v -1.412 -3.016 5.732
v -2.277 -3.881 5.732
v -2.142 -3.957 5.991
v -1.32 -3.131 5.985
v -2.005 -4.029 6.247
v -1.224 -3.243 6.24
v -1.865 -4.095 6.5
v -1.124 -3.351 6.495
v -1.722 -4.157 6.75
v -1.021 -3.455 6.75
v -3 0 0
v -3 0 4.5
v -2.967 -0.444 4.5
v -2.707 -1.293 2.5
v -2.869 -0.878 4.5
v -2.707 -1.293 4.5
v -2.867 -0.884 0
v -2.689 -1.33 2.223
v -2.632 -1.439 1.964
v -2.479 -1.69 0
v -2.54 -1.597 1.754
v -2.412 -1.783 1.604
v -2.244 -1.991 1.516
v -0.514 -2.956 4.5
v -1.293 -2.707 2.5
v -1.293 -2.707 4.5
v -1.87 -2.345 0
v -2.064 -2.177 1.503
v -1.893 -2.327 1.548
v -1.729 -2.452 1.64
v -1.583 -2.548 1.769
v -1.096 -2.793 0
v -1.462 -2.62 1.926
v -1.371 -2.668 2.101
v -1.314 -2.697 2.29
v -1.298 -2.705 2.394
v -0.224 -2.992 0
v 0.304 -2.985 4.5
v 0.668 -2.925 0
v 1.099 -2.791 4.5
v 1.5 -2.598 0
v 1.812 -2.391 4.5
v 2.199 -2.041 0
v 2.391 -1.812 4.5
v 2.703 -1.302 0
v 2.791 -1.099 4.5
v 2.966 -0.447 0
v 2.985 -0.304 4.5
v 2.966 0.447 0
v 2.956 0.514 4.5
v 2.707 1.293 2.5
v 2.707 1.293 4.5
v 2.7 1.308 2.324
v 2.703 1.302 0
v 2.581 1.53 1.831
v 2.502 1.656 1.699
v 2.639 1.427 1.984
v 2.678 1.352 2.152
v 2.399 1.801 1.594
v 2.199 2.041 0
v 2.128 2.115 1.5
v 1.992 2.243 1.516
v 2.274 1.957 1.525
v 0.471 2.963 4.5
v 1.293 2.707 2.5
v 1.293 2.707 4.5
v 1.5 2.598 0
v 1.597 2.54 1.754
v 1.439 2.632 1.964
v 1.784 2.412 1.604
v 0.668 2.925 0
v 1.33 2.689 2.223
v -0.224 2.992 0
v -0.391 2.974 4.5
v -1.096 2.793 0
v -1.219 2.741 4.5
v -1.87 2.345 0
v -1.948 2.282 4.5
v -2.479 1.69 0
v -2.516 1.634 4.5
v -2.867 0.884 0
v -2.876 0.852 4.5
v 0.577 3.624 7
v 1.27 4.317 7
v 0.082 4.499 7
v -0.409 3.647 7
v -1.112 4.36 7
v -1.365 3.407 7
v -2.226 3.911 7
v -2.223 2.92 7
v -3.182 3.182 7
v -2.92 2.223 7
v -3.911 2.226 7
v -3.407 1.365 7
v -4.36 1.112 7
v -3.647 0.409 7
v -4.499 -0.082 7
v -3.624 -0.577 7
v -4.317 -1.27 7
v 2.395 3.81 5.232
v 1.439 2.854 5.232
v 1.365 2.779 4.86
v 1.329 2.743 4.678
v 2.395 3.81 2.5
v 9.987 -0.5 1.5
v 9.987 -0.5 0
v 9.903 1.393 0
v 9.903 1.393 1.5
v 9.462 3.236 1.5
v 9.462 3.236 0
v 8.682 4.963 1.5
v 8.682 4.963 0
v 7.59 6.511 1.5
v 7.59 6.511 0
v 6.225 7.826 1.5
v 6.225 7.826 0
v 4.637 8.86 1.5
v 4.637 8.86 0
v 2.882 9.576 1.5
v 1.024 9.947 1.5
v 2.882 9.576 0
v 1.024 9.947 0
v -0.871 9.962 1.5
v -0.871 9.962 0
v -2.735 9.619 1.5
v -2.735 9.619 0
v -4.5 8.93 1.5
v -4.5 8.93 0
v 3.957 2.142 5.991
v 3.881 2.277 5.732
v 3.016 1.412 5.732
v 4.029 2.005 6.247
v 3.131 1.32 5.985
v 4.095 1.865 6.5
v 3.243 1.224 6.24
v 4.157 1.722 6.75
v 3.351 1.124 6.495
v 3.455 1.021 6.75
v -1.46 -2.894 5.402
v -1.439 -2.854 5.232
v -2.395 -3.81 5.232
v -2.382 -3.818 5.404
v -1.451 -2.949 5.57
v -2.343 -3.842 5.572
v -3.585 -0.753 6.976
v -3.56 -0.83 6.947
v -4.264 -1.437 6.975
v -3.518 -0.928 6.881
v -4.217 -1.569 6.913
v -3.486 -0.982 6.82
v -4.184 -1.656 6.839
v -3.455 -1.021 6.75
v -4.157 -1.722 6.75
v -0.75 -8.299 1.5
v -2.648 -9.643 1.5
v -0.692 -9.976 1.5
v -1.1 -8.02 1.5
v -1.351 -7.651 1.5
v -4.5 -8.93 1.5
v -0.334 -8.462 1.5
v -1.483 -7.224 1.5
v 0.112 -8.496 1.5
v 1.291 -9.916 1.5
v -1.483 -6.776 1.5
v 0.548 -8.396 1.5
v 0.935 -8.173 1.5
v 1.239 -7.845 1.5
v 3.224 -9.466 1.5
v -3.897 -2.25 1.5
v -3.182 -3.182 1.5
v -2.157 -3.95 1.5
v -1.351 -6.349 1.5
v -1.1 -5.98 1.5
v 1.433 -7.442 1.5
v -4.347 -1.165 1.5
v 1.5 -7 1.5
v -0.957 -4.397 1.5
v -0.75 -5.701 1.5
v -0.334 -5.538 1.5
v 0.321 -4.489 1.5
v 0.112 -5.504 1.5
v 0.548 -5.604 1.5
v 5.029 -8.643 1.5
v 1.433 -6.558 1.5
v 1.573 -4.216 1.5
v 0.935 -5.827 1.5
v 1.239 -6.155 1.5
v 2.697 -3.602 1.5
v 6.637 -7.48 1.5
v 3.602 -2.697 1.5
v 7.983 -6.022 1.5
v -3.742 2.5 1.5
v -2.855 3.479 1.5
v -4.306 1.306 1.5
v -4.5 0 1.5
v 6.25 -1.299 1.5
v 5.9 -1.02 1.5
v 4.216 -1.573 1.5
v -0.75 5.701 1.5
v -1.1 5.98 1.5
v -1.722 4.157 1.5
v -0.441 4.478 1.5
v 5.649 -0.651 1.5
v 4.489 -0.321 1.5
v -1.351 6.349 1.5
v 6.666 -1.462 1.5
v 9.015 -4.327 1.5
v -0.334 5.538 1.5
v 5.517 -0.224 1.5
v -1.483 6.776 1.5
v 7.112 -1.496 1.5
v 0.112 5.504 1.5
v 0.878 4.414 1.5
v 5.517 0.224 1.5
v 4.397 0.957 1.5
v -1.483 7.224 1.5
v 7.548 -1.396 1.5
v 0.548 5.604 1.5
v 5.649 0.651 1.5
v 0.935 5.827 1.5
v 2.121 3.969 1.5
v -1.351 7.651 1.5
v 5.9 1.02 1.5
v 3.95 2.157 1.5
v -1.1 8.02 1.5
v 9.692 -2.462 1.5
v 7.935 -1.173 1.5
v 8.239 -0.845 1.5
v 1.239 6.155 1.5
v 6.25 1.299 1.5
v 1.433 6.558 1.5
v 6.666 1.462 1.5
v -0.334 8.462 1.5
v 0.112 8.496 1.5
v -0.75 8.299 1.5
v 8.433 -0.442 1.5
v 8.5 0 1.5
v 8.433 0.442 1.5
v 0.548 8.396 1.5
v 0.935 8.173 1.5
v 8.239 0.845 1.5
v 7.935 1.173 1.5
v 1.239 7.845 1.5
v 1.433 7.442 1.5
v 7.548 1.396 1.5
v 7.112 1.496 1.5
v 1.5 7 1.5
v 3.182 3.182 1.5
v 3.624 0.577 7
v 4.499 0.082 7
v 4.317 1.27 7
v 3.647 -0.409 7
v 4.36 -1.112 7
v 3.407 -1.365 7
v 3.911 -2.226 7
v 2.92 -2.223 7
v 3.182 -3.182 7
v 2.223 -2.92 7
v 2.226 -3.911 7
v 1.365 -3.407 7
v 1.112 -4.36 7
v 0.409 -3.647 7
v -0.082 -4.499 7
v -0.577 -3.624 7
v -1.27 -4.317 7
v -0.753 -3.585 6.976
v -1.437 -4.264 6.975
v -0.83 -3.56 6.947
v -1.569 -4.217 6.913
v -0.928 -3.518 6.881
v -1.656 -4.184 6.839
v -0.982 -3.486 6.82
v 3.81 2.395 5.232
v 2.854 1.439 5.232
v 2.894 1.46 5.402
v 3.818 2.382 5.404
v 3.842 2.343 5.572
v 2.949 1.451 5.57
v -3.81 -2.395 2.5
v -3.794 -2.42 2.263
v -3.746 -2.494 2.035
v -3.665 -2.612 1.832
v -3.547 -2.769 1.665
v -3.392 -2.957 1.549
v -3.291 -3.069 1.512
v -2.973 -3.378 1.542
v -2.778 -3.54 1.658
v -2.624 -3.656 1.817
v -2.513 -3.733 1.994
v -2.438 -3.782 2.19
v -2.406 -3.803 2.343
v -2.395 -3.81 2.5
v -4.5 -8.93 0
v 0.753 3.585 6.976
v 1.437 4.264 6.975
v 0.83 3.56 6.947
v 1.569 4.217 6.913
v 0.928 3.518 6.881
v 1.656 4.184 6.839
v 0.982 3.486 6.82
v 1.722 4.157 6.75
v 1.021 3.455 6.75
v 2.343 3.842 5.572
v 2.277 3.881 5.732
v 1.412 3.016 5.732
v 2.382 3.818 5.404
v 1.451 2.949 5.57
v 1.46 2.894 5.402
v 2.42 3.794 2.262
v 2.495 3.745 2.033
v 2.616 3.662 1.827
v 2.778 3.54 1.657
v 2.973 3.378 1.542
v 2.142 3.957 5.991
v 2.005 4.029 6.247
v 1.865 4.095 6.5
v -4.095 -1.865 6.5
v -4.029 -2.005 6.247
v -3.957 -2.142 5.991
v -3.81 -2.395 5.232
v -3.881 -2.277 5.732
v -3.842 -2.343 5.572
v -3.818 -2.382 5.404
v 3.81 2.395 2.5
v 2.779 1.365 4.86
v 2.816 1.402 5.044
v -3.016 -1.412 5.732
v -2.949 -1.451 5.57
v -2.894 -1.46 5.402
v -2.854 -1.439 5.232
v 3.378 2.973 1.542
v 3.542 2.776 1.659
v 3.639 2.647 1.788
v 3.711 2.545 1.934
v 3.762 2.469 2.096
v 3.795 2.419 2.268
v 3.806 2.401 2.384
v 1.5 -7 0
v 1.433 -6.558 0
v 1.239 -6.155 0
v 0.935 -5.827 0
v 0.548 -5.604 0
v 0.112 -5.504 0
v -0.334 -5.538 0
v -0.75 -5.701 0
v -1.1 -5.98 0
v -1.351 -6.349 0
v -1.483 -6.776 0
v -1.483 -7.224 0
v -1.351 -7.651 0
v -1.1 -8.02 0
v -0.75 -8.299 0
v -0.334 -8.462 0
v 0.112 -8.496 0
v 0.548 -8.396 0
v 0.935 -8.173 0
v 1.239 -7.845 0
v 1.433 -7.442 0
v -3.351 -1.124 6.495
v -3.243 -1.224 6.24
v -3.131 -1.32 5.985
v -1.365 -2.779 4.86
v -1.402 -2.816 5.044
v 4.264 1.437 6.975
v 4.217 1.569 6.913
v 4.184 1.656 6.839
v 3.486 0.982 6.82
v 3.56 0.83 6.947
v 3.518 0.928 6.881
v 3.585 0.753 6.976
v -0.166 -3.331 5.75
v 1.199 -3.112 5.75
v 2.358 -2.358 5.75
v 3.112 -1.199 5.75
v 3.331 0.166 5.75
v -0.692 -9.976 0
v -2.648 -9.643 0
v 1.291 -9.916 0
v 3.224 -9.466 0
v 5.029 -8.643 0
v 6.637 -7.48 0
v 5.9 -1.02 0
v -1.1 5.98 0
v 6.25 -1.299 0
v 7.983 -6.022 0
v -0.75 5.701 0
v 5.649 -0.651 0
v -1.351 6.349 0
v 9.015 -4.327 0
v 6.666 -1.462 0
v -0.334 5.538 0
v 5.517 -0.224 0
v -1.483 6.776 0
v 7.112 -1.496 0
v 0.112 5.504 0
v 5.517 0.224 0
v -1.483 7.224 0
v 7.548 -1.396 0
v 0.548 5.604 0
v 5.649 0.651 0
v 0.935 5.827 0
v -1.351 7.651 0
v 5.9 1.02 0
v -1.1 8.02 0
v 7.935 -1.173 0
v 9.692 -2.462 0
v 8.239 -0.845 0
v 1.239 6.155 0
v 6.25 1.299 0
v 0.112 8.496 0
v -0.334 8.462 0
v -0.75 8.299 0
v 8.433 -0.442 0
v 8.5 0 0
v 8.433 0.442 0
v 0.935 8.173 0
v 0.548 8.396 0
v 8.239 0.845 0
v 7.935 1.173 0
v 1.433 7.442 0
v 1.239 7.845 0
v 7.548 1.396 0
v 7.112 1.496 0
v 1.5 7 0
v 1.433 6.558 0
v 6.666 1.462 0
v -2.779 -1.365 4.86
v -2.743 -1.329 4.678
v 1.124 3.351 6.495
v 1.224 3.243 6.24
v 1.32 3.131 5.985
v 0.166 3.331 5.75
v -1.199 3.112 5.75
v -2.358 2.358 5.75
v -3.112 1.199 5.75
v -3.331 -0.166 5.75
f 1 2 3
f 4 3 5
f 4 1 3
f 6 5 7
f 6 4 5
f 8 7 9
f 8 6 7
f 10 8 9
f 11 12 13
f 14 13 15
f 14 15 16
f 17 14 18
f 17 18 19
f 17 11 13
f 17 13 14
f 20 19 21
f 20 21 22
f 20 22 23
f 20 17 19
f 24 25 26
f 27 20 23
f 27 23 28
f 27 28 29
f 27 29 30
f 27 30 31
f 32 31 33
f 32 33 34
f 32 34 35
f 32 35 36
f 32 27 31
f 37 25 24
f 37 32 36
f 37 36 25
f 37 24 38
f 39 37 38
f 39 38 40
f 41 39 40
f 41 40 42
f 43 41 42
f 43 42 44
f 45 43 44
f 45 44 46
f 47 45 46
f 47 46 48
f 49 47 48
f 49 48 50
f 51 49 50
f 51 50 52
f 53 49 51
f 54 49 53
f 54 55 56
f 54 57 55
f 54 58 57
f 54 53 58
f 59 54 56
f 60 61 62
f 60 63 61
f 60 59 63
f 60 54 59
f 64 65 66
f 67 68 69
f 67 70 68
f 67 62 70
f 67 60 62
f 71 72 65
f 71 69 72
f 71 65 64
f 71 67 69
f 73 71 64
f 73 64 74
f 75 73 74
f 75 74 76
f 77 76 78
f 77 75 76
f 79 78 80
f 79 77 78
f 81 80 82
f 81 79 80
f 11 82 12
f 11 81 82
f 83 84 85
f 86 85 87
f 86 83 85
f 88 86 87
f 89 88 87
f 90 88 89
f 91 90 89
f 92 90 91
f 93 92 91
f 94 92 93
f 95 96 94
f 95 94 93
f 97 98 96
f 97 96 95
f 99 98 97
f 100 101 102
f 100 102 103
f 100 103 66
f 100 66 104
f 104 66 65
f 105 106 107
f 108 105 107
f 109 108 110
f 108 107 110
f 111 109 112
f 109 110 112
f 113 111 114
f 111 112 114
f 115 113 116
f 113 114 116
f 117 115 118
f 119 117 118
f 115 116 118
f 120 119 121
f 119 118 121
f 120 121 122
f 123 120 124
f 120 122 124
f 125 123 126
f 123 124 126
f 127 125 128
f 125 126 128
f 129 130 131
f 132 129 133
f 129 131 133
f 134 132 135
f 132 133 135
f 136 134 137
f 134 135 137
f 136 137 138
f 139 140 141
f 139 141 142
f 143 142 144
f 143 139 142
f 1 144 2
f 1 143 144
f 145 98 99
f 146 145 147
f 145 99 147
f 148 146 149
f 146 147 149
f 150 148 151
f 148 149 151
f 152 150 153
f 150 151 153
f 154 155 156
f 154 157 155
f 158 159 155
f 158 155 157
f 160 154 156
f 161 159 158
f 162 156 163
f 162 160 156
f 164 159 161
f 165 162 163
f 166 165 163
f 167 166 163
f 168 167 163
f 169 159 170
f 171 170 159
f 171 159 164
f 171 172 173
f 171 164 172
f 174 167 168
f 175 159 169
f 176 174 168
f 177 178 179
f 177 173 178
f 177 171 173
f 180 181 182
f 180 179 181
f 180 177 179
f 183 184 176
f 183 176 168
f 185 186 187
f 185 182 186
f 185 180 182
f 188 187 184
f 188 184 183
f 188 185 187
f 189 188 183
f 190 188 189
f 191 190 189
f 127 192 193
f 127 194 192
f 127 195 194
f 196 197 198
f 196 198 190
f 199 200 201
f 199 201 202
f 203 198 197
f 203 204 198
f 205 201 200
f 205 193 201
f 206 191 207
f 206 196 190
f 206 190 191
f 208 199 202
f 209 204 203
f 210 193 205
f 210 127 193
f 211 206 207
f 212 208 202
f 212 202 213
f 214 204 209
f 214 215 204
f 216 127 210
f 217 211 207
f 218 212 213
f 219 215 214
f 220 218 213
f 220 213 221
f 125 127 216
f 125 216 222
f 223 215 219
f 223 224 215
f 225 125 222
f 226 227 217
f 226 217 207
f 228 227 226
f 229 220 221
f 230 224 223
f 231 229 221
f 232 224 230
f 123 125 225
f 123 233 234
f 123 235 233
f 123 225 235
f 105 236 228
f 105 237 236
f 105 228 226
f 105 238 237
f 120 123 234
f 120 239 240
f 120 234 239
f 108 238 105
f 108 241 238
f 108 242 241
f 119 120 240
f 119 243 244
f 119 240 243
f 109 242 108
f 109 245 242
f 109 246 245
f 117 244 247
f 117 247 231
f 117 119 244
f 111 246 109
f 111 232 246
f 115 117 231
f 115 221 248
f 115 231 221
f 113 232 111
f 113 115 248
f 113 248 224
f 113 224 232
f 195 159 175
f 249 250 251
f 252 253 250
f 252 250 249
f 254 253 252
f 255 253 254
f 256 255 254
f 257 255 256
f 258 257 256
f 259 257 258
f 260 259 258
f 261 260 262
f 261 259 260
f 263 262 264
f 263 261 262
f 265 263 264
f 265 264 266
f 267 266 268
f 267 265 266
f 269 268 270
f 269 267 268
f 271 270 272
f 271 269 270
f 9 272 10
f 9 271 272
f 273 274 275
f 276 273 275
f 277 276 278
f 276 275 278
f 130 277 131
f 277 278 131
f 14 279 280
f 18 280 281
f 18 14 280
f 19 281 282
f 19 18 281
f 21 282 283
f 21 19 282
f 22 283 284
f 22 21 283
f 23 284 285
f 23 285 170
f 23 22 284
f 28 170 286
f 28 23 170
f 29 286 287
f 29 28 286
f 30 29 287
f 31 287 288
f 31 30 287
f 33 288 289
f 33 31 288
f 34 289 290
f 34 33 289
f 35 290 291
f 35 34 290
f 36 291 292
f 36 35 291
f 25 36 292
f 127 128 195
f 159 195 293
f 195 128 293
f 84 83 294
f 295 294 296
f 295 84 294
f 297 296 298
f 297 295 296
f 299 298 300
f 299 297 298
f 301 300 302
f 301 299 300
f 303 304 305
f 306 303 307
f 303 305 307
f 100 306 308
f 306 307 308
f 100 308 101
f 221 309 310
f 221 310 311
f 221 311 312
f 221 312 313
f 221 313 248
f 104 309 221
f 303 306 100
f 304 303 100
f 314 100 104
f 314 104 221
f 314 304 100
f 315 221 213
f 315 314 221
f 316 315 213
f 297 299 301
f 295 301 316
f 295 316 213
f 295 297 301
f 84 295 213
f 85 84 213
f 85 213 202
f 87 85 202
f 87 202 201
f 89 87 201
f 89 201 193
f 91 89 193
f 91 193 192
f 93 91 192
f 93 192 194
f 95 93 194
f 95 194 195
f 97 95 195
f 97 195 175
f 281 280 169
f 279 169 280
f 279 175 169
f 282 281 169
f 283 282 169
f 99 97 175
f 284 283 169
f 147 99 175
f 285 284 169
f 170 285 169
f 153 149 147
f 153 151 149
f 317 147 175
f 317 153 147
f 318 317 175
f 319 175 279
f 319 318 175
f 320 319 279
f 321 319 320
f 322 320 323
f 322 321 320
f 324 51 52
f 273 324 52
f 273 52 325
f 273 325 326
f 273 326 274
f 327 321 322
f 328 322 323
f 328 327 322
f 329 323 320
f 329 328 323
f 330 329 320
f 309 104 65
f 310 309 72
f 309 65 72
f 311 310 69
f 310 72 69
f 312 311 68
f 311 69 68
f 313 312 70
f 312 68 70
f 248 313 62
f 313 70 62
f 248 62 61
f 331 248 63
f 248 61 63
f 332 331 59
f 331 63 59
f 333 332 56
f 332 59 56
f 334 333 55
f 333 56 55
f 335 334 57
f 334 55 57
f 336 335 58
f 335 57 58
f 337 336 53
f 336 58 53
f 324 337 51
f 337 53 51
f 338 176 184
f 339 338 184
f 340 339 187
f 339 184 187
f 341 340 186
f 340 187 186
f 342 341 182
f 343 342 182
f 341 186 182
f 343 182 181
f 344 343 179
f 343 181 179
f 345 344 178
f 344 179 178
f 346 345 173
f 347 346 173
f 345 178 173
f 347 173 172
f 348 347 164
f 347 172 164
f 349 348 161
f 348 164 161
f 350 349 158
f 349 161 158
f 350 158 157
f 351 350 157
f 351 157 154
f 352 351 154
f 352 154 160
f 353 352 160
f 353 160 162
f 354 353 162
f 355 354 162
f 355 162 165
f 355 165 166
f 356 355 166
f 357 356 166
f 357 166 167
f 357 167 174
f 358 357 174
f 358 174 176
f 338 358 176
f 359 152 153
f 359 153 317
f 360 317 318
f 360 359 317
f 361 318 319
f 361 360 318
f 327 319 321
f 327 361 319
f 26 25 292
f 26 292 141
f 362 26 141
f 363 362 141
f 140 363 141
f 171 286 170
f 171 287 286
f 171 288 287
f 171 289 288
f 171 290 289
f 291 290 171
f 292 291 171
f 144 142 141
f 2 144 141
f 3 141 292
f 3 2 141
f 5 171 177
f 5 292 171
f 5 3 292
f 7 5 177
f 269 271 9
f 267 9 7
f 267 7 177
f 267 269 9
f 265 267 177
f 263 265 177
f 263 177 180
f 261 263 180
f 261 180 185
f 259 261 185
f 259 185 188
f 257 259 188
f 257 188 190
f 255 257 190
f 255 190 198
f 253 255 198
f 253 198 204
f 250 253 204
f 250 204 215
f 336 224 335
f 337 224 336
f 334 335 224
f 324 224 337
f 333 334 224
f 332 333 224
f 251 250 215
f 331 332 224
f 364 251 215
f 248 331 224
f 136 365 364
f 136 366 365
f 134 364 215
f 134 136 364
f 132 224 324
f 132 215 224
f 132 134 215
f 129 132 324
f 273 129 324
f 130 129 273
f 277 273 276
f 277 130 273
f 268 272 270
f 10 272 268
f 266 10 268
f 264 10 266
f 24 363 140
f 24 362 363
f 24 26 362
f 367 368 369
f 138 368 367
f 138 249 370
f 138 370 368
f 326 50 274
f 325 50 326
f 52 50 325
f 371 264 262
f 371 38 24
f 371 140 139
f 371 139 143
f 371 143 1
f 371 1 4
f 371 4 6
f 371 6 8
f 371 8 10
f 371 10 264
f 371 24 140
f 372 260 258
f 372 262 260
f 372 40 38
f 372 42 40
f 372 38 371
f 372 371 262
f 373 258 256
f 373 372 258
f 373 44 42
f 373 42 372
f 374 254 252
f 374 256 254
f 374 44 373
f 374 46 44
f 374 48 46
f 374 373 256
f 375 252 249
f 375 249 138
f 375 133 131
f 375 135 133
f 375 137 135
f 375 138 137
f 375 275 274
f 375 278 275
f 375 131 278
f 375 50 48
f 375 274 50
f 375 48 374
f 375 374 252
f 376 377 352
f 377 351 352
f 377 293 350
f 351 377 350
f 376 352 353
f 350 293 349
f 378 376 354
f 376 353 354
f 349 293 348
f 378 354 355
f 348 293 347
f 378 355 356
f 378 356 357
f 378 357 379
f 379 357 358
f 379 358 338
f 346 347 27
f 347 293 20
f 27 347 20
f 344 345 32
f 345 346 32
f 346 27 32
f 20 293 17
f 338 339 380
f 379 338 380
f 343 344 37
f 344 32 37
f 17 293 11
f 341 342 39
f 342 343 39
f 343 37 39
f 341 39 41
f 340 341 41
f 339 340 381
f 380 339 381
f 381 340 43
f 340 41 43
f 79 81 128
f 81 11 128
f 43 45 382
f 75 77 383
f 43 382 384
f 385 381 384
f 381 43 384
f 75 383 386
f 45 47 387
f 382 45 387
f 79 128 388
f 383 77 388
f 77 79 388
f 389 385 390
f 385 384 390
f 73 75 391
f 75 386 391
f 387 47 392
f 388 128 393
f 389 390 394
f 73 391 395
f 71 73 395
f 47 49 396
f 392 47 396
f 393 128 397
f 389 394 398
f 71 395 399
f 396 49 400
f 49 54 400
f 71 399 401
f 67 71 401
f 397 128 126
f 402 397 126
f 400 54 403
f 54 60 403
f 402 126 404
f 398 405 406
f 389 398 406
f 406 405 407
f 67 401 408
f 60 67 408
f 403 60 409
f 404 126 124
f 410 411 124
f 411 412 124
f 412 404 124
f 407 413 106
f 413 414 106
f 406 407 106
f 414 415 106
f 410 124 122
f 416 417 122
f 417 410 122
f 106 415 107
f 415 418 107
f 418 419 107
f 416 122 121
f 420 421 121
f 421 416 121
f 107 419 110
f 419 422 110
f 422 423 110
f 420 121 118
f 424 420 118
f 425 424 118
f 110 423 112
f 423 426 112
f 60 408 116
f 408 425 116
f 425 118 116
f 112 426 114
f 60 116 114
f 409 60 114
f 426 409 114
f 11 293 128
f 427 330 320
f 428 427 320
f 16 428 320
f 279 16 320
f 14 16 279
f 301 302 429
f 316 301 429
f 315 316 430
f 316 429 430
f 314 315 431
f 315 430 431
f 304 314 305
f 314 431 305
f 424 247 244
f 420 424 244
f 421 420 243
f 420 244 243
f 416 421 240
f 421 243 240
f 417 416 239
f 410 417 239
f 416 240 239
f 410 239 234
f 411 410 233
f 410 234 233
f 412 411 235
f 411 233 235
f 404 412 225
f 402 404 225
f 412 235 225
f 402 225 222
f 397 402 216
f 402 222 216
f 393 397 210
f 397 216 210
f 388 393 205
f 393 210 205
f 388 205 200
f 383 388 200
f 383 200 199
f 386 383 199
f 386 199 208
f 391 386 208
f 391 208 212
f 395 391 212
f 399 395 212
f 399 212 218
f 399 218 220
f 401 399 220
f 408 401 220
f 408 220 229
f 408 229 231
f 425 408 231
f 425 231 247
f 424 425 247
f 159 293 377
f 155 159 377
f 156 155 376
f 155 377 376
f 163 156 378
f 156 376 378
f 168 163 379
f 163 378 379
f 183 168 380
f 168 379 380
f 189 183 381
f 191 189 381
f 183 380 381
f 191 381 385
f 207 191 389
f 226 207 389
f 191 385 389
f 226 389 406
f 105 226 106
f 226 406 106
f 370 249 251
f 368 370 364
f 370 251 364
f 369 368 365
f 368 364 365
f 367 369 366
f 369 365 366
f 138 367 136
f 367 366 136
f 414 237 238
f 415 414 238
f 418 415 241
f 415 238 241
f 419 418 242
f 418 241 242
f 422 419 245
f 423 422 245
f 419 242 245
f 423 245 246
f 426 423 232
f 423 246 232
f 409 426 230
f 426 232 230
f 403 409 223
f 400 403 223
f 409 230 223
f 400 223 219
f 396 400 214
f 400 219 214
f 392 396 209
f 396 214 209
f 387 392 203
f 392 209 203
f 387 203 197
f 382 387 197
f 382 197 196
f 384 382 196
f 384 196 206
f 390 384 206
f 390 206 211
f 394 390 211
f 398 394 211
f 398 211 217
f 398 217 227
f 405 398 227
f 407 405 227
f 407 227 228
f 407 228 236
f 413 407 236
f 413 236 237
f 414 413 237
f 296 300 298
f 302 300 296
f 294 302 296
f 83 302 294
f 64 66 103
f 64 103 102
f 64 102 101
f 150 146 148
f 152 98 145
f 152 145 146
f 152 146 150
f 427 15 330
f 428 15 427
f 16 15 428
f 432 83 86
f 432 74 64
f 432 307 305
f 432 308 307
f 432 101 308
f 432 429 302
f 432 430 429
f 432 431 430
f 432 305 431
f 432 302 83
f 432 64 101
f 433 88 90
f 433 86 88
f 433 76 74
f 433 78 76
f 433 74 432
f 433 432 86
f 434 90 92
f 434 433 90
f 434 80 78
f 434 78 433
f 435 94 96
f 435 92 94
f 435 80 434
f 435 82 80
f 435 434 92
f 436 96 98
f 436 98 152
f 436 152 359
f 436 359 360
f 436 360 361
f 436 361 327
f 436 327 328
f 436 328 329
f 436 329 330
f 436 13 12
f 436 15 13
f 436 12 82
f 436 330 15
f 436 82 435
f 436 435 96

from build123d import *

# Parameters (mm, degrees)
ESQUISSE1_R                  = 3
BOSS_EXTRU_1_DEPTH           = 1.5
ENL_V_MAT_EXTRU_1_DEPTH      = 16.779733838
ENL_V_MAT_EXTRU_1_DEPTH_BACK = 16.779733838
ESQUISSE4_R                  = 1.5
ENL_V_MAT_EXTRU_2_DEPTH      = 14.2
CONG_2_R                     = 0.5


with BuildPart() as part:
    # Esquisse1 → Boss.-Extru.1 (new body)
    with BuildSketch(Plane.XY):
        with BuildLine():
            Line((-4.5, 8.93028555), (-4.5, -8.93028555))
            ThreePointArc((-4.5, -8.93028555), (5.029430583, -8.643195475), (9.987487585, -0.500091723))
            ThreePointArc((9.987487585, -0.500091723), (5.455376603, 8.380863089), (-4.5, 8.93028555))
        make_face()
        with Locations(Location((0, 0, 0), (0, 0, 180))):
            Circle(ESQUISSE1_R, mode=Mode.SUBTRACT)
    extrude(amount=BOSS_EXTRU_1_DEPTH)

    # Esquisse2 → R_volution1 (revolve)
    with BuildSketch(Plane(origin=(0, 0, 0), x_dir=(0, 0, -1), z_dir=(1, 0, 0)), mode=Mode.PRIVATE) as r_volution1_sk:
        Polygon((-1.5, 4.5), (-7, 4.5), (-7, 3.669872981), (-4.5, 3), (-1.5, 3), align=None)
    revolve(r_volution1_sk.sketch.rotate(Axis((0, 0, 0), (0, 0, 1)), 90), axis=Axis((0, 0, 0), (0, 0, 1)))

    # Esquisse3 → Enl_v. mat.-Extru.1 (cut, two sides)
    with BuildSketch(Plane(origin=(0, 0, 0), x_dir=(0, 0, 1), z_dir=(0.7071067811865464, 0.7071067811865488, 0))) as enl_v_mat_extru_1_sk:
        with BuildLine():
            Line((2.5, 1), (5.232050808, 1))
            ThreePointArc((5.232050808, 1), (5.490869853, 1.034074174), (5.732050808, 1.133974596))
            Line((5.732050808, 1.133974596), (7, 1.866025404))
            Line((7, 1.866025404), (7, -1.866025404))
            Line((7, -1.866025404), (5.732050808, -1.133974596))
            ThreePointArc((5.732050808, -1.133974596), (5.490869853, -1.034074174), (5.232050808, -1))
            Line((5.232050808, -1), (2.5, -1))
            ThreePointArc((2.5, -1), (1.5, 0), (2.5, 1))
        make_face()
    extrude(amount=ENL_V_MAT_EXTRU_1_DEPTH, mode=Mode.SUBTRACT)
    extrude(enl_v_mat_extru_1_sk.sketch, amount=-ENL_V_MAT_EXTRU_1_DEPTH_BACK, mode=Mode.SUBTRACT)

    # Esquisse4 → Enl_v. mat.-Extru.2 (cut)
    with BuildSketch(Plane.XY.offset(1.5)):
        with Locations((0, -7)):
            Circle(ESQUISSE4_R)
        with Locations((0, 7)):
            Circle(ESQUISSE4_R)
        with Locations((7, 0)):
            Circle(ESQUISSE4_R)
    extrude(amount=-ENL_V_MAT_EXTRU_2_DEPTH, mode=Mode.SUBTRACT)

    # Cong_2
    cong_2_edges = [part.edges().sort_by_distance(p)[0] for p in [
        (-3.884480351, -1.245521917, 7),
        (1.245521917, 3.884480351, 7),
        (3.884480351, 1.245521917, 7),
        (-1.245521917, -3.884480351, 7),
    ]]
    fillet(cong_2_edges, radius=CONG_2_R)


solid = part.part
